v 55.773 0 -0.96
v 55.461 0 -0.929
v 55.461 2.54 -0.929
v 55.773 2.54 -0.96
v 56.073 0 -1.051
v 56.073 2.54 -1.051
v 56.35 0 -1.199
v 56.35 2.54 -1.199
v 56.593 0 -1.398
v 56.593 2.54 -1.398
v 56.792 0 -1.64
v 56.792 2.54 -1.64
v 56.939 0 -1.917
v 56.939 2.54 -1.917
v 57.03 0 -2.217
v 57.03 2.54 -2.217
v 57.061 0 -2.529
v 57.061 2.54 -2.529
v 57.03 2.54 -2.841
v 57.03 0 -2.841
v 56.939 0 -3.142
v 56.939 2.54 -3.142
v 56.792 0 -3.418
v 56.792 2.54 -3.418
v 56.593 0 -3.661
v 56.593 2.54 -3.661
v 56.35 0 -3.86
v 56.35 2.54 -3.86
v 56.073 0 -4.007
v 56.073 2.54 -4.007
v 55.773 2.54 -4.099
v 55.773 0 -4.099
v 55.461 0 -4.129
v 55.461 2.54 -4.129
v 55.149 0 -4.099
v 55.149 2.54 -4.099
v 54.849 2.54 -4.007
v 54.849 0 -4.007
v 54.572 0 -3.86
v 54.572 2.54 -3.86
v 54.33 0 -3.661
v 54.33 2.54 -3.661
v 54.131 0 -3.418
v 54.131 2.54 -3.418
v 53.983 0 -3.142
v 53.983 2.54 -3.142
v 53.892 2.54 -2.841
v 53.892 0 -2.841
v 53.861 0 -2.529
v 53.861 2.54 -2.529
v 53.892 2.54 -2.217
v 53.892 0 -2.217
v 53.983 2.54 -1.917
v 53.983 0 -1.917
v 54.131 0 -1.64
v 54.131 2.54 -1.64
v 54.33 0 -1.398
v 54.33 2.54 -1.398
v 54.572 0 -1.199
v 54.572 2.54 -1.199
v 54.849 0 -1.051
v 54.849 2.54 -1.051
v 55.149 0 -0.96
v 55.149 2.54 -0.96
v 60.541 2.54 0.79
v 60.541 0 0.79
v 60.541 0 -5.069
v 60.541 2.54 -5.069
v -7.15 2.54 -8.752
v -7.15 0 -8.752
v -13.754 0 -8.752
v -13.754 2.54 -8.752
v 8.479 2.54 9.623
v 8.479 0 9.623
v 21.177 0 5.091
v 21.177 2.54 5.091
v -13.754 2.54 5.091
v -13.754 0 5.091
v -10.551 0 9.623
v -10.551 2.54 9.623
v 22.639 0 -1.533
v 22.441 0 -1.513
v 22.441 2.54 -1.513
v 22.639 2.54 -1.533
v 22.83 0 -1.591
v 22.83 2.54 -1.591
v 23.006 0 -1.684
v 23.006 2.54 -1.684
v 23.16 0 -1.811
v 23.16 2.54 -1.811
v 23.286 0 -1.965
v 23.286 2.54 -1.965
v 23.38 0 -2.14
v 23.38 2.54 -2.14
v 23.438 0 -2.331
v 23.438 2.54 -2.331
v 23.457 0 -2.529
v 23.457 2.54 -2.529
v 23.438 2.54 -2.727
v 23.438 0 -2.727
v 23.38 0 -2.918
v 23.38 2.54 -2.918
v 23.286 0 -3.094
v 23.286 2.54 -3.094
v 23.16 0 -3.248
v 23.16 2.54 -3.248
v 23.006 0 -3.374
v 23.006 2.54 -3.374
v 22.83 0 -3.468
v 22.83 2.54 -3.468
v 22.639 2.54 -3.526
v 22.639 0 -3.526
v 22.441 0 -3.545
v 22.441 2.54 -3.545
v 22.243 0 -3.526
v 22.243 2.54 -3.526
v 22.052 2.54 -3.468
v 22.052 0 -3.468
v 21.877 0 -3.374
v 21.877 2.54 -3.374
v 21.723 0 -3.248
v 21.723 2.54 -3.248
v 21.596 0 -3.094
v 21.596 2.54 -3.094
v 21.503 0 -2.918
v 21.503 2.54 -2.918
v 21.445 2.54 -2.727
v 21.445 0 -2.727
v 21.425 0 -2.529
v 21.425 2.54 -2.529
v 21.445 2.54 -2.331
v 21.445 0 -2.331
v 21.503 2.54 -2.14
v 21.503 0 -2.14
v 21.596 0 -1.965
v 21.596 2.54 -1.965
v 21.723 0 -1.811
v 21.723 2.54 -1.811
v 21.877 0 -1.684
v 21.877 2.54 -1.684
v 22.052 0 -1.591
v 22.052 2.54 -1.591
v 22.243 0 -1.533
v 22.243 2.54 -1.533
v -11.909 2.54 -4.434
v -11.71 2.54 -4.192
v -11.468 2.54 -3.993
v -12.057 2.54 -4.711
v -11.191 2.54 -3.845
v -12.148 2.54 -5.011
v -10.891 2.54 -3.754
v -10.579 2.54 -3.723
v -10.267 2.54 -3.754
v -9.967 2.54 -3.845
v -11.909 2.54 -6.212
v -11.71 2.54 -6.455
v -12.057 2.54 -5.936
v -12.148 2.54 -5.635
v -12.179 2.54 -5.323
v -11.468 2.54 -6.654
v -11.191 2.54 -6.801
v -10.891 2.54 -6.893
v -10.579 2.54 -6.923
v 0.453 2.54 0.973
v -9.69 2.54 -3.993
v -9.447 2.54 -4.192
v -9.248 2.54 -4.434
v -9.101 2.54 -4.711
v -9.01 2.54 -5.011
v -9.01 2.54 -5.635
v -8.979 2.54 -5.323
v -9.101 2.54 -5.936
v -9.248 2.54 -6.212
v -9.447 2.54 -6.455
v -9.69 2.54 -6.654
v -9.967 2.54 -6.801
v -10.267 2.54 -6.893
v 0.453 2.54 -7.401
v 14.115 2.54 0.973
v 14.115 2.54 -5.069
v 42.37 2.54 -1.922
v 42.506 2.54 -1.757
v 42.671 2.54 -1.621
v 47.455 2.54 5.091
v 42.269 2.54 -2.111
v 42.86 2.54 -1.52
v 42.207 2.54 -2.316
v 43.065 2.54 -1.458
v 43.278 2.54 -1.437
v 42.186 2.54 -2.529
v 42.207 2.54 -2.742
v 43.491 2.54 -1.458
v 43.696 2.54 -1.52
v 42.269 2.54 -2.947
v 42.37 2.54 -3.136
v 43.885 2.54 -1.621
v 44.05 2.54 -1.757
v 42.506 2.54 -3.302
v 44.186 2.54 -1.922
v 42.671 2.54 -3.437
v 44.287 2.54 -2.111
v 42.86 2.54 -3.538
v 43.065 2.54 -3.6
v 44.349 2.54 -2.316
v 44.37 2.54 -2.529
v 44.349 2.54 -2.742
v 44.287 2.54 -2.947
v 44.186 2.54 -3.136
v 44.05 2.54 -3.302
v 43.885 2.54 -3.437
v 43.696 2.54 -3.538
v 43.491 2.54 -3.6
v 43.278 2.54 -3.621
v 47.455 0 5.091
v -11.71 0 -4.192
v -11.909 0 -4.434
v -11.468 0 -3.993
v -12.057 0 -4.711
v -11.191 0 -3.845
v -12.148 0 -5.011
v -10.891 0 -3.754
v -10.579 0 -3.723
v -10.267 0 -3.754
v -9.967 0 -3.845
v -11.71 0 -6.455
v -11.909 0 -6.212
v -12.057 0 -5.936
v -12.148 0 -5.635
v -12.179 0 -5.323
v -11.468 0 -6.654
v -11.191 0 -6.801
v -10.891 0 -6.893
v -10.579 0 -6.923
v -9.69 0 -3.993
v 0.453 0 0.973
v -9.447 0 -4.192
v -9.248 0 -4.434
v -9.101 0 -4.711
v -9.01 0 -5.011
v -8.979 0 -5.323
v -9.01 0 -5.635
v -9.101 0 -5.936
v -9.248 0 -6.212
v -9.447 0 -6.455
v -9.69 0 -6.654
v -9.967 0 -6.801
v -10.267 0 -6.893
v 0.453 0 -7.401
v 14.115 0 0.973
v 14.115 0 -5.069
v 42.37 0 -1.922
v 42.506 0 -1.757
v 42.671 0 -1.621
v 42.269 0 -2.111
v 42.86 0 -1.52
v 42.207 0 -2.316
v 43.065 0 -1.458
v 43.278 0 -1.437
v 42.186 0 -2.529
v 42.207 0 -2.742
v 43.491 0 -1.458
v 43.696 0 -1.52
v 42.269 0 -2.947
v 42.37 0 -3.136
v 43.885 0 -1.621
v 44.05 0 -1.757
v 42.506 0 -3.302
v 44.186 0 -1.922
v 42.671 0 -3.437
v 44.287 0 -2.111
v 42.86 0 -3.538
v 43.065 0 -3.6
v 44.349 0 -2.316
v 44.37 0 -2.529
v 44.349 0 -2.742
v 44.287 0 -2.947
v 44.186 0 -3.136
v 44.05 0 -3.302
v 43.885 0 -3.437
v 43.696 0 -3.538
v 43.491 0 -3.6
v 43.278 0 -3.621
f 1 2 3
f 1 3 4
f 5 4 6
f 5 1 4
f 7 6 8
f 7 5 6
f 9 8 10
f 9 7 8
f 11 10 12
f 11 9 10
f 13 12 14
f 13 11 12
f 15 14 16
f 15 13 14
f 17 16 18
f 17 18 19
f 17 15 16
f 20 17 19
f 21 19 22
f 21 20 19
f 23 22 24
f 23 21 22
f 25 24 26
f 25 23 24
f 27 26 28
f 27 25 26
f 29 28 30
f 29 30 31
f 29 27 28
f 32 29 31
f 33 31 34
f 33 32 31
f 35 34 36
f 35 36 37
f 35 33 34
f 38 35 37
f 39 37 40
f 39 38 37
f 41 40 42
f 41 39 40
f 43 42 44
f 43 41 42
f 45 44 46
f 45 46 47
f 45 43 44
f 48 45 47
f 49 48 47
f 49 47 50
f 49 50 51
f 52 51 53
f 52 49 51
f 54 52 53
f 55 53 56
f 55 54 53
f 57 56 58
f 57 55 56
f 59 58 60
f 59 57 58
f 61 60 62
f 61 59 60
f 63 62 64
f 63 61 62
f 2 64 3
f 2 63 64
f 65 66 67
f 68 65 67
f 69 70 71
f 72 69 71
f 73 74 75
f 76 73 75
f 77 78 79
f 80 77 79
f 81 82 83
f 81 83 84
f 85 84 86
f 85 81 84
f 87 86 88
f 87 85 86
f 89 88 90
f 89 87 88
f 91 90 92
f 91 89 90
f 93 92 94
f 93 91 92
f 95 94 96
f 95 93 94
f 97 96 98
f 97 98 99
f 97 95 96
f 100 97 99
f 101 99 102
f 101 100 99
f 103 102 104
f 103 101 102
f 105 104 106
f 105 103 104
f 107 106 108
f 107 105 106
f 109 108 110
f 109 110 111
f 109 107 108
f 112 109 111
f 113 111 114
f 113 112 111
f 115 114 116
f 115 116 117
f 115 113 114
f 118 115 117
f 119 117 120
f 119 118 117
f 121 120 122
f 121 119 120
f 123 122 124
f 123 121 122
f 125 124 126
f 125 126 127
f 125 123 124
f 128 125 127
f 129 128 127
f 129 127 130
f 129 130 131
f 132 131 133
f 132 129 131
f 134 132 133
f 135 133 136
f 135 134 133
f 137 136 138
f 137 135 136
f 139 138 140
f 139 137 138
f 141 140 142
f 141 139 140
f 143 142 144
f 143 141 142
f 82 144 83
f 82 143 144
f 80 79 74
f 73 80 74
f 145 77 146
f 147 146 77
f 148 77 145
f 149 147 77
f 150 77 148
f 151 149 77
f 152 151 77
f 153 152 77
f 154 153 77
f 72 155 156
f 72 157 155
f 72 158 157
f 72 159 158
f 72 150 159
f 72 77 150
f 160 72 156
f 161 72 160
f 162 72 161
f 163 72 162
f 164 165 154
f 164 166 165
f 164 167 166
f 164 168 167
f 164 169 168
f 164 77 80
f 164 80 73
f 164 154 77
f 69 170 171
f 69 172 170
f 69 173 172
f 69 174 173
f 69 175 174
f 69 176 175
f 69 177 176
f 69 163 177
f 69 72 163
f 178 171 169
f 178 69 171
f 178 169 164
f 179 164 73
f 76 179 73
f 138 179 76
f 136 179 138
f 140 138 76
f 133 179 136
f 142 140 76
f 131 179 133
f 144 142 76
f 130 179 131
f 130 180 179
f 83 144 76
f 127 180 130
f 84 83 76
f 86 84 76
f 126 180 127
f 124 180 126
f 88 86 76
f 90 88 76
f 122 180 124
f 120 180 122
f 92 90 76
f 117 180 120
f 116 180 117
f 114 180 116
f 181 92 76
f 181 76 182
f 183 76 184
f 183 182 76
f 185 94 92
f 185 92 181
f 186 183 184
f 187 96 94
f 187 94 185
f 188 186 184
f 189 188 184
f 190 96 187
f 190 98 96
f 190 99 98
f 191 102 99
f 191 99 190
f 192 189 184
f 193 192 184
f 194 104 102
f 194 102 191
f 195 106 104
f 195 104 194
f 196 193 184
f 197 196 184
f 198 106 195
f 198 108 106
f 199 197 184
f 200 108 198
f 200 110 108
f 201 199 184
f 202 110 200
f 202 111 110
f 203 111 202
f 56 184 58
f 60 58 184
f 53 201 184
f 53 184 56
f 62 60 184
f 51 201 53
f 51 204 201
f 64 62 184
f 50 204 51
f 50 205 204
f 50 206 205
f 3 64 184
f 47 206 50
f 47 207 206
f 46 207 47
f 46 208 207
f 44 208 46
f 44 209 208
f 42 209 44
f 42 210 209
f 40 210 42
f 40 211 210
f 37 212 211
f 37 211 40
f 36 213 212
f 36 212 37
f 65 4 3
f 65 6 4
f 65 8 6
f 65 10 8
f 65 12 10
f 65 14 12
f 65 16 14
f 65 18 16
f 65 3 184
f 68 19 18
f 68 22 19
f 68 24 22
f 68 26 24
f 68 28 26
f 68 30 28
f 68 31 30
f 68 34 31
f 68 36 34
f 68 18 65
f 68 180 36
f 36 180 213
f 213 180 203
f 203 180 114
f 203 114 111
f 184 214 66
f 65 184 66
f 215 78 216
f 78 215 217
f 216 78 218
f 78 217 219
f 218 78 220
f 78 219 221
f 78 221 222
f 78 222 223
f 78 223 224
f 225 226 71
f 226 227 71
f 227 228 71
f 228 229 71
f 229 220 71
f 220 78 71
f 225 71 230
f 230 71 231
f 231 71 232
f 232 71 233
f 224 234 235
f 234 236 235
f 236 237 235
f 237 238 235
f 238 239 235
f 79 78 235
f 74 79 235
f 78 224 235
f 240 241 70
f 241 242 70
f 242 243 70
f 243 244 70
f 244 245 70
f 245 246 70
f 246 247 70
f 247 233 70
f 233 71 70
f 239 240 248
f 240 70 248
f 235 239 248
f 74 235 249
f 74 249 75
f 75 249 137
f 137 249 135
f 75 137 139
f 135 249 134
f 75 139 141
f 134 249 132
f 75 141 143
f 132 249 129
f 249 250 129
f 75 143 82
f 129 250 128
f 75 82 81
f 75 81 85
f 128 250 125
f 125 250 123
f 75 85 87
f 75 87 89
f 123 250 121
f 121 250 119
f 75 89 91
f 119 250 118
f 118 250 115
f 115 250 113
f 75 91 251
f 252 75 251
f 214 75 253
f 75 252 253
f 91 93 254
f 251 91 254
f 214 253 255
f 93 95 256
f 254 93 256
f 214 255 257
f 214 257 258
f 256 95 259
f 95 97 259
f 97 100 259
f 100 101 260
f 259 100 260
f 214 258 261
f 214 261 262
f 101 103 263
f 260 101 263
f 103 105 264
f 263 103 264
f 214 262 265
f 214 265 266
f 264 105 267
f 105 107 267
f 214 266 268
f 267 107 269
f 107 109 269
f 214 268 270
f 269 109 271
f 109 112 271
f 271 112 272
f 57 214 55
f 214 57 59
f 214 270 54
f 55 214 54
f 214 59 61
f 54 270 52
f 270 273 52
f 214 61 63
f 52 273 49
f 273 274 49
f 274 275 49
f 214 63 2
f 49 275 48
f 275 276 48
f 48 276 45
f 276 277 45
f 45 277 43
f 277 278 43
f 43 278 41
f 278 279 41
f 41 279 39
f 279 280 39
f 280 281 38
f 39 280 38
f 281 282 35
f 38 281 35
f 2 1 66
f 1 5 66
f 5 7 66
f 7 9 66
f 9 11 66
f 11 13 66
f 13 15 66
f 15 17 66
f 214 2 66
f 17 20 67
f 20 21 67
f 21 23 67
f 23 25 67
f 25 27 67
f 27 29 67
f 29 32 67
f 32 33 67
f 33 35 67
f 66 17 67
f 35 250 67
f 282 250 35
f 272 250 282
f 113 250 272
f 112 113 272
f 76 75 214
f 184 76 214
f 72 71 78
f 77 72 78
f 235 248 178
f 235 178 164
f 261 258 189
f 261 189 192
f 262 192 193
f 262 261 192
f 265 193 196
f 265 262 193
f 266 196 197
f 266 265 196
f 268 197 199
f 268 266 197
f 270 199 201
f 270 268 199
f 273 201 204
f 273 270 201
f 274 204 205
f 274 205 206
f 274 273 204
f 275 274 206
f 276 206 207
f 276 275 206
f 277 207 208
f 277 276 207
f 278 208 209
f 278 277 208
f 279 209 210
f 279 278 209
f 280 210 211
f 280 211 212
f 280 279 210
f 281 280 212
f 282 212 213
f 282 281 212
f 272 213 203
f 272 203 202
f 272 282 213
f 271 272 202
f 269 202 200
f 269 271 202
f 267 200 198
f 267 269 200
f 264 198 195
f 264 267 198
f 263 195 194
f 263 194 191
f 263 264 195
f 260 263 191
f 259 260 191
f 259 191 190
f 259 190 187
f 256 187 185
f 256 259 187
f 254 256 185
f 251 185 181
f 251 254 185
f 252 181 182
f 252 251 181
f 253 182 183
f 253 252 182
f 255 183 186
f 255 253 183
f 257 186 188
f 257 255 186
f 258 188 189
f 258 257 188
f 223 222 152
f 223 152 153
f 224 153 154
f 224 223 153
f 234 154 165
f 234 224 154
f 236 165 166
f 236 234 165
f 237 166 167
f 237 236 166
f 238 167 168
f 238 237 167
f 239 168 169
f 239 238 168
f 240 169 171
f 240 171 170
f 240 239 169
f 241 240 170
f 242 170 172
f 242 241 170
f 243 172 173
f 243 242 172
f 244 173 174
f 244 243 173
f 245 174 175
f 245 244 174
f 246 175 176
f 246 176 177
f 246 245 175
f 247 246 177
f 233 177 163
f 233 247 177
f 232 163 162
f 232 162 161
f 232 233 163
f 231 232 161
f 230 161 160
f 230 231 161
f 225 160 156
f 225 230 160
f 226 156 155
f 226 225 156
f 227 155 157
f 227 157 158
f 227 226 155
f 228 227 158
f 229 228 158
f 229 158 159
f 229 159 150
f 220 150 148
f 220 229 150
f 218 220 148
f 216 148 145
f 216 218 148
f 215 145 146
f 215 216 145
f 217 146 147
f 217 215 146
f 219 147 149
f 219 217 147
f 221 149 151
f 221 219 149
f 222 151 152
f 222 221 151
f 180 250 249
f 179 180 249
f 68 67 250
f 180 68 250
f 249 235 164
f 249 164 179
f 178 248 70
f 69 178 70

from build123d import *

# Parameters (mm, degrees)
SKETCH1_R           = 1.016
SKETCH1_R_2         = 1.600000102
SKETCH1_R_3         = 1.0922
BOSS_EXTRUDE1_DEPTH = 2.54
SKETCH2_W           = 13.66210268
SKETCH2_H           = 9.772536081
CUT_EXTRUDE1_DEPTH  = 2.54


with BuildPart() as part:
    # Sketch1 → Boss-Extrude1 (new body)
    with BuildSketch(Plane(origin=(0, 0, 0), x_dir=(1, 0, 0), z_dir=(0, 1, 0))):
        Polygon((-13.753823011, 8.752244808), (-13.753823011, 2.783244808), (-13.753823011, -5.090755192), (-10.551287224, -9.623078218), (8.47904741, -9.623078218), (21.176501094, -5.090755192), (33.876501094, -5.090755192), (47.455454133, -5.090755192), (60.541176989, -0.789612996), (60.541176989, -0.010755192), (60.541176989, 5.069244808), (37.046176989, 5.069244808), (25.616176989, 5.069244808), (13.567051989, 5.069244808), (-7.149823011, 8.752244808), align=None)
        with Locations(Location((22.441176989, 2.529244808, 0), (0, 0, 270))):
            Circle(SKETCH1_R, mode=Mode.SUBTRACT)
        with Locations(Location((55.461176989, 2.529244808, 0), (0, 0, 270))):
            Circle(SKETCH1_R_2, mode=Mode.SUBTRACT)
        with Locations(Location((-10.578823011, 5.323244808, 0), (0, 0, 270))):
            Circle(SKETCH1_R_2, mode=Mode.SUBTRACT)
        with Locations(Location((43.278107208, 2.529244808, 0), (0, 0, 270))):
            Circle(SKETCH1_R_3, mode=Mode.SUBTRACT)
    extrude(amount=BOSS_EXTRUDE1_DEPTH)

    # Sketch2 → Cut-Extrude1 (cut)
    with BuildSketch(Plane.XZ):
        with Locations((7.284233537, -3.91320906)):
            Rectangle(SKETCH2_W, SKETCH2_H)
    extrude(amount=-CUT_EXTRUDE1_DEPTH, mode=Mode.SUBTRACT)


solid = part.part
